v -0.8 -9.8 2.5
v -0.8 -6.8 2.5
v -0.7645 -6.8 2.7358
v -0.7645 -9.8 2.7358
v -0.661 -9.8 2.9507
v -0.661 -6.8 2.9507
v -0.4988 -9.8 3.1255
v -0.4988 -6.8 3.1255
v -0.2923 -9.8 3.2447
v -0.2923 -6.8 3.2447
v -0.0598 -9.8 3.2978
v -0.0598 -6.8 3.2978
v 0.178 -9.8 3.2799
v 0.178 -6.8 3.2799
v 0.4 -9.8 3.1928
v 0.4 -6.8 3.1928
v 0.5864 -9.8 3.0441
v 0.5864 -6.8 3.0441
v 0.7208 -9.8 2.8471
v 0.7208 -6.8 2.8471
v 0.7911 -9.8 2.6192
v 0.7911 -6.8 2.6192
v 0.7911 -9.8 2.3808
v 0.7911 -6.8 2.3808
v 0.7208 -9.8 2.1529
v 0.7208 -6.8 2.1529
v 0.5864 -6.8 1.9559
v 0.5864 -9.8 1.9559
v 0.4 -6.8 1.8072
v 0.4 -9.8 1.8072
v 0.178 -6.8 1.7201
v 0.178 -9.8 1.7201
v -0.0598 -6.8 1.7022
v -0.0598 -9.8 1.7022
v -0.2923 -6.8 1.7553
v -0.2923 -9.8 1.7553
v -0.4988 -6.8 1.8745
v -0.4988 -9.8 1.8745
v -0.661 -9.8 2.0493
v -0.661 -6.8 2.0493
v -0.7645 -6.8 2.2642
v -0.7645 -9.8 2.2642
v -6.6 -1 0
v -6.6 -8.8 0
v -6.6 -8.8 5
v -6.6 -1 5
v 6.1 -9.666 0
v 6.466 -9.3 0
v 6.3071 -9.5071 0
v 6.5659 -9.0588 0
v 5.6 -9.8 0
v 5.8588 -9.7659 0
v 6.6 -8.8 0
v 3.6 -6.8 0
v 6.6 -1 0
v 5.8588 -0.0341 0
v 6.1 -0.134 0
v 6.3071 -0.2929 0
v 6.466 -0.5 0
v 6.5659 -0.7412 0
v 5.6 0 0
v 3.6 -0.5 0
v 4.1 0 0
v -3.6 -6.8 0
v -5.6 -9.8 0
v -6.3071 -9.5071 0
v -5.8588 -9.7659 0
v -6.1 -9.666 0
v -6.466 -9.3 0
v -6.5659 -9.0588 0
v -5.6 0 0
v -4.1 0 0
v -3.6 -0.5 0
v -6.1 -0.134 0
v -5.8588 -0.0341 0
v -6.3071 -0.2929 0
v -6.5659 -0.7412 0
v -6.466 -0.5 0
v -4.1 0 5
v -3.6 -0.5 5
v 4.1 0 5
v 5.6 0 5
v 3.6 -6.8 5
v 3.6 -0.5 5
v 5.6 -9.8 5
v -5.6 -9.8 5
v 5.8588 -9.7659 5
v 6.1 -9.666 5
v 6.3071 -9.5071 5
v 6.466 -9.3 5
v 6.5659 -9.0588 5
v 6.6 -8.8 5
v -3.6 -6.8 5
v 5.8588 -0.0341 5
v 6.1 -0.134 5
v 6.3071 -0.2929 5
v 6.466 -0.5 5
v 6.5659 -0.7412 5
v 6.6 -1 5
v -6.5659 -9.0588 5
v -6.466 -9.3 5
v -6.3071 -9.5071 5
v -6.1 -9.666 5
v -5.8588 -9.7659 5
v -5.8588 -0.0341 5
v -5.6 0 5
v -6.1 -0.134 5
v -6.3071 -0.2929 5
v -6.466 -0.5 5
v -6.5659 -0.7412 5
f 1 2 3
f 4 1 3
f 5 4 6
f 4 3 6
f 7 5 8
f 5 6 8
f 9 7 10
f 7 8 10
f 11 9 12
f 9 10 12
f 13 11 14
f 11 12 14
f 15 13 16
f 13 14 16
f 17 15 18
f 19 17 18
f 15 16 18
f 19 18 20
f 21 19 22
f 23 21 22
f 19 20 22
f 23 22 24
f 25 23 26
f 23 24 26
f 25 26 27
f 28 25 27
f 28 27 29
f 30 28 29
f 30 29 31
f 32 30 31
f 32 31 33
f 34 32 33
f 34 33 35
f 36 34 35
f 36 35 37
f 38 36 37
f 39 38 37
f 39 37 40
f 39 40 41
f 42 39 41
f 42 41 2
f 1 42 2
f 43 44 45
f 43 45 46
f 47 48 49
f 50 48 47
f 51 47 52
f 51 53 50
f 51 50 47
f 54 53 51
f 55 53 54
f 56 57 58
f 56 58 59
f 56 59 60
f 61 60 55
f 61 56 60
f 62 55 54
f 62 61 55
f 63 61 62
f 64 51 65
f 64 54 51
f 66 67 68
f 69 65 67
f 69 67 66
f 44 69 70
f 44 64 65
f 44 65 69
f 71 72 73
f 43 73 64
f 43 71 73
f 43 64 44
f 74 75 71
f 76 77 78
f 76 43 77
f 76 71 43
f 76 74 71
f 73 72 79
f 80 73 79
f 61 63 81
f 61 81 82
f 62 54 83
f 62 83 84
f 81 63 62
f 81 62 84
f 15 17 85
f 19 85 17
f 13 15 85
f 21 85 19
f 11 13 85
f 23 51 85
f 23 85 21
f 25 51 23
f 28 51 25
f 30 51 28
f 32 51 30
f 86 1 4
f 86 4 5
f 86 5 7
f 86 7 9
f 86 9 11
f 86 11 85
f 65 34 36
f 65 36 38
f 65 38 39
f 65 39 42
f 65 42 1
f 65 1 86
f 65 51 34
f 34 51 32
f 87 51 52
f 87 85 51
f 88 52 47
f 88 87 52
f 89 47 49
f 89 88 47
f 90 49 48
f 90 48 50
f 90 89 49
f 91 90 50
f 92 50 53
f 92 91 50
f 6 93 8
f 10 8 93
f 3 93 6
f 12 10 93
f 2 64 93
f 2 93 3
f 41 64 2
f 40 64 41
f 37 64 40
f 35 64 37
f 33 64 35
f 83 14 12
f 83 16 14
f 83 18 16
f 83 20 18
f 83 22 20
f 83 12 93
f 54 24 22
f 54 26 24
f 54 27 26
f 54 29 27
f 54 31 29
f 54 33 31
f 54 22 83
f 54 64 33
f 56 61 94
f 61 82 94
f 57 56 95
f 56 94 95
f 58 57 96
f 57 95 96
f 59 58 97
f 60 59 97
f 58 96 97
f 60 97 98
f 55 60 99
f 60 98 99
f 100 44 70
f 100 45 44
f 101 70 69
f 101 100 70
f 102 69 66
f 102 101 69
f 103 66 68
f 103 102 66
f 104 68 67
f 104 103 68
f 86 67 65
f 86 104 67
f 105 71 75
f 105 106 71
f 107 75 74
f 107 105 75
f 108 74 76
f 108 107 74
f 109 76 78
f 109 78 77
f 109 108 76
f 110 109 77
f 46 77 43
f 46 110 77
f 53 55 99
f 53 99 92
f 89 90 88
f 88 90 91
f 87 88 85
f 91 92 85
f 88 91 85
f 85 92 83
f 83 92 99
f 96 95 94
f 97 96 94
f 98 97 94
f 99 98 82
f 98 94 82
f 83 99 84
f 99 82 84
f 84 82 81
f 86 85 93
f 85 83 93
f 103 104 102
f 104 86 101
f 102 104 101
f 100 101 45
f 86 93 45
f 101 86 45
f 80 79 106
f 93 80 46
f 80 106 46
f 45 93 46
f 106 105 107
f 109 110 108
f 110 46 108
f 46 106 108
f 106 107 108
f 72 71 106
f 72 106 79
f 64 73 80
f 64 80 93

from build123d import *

# Parameters (mm, degrees)
EXTRUDE_1_DEPTH     = 5
CHAMFER_1_SIZE      = 0.5
FILLET_1_R          = 1
SKETCH_3_R          = 0.8
CUT_EXTRUDE_1_DEPTH = 4


with BuildPart() as part:
    # 草图2 → 凸台-拉伸1 (new body)
    with BuildSketch(Plane.XY):
        Polygon((-3.6, 0), (-3.6, -6.8), (3.6, -6.8), (3.6, 0), (6.6, 0), (6.6, -9.8), (-6.6, -9.8), (-6.6, 0), align=None)
    extrude(amount=EXTRUDE_1_DEPTH)

    # 倒角1
    chamfer_1_edges = [part.edges().sort_by_distance(p)[0] for p in [
        (-3.6, 0, 2.5),
        (3.6, 0, 2.5),
    ]]
    chamfer(chamfer_1_edges, length=CHAMFER_1_SIZE)

    # 圆角1
    fillet_1_edges = [part.edges().sort_by_distance(p)[0] for p in [
        (6.6, 0, 2.5),
        (6.6, -9.8, 2.5),
        (-6.6, -9.8, 2.5),
        (-6.6, 0, 2.5),
    ]]
    fillet(fillet_1_edges, radius=FILLET_1_R)

    # 草图3 → 切除-拉伸1 (cut)
    with BuildSketch(Plane(origin=(0, -6.8, 0), x_dir=(1, 0, 0), z_dir=(0, 1, 0))):
        with Locations(Location((0, -2.5, 0), (0, 0, 180))):
            Circle(SKETCH_3_R)
    extrude(amount=-CUT_EXTRUDE_1_DEPTH, mode=Mode.SUBTRACT)


solid = part.part
